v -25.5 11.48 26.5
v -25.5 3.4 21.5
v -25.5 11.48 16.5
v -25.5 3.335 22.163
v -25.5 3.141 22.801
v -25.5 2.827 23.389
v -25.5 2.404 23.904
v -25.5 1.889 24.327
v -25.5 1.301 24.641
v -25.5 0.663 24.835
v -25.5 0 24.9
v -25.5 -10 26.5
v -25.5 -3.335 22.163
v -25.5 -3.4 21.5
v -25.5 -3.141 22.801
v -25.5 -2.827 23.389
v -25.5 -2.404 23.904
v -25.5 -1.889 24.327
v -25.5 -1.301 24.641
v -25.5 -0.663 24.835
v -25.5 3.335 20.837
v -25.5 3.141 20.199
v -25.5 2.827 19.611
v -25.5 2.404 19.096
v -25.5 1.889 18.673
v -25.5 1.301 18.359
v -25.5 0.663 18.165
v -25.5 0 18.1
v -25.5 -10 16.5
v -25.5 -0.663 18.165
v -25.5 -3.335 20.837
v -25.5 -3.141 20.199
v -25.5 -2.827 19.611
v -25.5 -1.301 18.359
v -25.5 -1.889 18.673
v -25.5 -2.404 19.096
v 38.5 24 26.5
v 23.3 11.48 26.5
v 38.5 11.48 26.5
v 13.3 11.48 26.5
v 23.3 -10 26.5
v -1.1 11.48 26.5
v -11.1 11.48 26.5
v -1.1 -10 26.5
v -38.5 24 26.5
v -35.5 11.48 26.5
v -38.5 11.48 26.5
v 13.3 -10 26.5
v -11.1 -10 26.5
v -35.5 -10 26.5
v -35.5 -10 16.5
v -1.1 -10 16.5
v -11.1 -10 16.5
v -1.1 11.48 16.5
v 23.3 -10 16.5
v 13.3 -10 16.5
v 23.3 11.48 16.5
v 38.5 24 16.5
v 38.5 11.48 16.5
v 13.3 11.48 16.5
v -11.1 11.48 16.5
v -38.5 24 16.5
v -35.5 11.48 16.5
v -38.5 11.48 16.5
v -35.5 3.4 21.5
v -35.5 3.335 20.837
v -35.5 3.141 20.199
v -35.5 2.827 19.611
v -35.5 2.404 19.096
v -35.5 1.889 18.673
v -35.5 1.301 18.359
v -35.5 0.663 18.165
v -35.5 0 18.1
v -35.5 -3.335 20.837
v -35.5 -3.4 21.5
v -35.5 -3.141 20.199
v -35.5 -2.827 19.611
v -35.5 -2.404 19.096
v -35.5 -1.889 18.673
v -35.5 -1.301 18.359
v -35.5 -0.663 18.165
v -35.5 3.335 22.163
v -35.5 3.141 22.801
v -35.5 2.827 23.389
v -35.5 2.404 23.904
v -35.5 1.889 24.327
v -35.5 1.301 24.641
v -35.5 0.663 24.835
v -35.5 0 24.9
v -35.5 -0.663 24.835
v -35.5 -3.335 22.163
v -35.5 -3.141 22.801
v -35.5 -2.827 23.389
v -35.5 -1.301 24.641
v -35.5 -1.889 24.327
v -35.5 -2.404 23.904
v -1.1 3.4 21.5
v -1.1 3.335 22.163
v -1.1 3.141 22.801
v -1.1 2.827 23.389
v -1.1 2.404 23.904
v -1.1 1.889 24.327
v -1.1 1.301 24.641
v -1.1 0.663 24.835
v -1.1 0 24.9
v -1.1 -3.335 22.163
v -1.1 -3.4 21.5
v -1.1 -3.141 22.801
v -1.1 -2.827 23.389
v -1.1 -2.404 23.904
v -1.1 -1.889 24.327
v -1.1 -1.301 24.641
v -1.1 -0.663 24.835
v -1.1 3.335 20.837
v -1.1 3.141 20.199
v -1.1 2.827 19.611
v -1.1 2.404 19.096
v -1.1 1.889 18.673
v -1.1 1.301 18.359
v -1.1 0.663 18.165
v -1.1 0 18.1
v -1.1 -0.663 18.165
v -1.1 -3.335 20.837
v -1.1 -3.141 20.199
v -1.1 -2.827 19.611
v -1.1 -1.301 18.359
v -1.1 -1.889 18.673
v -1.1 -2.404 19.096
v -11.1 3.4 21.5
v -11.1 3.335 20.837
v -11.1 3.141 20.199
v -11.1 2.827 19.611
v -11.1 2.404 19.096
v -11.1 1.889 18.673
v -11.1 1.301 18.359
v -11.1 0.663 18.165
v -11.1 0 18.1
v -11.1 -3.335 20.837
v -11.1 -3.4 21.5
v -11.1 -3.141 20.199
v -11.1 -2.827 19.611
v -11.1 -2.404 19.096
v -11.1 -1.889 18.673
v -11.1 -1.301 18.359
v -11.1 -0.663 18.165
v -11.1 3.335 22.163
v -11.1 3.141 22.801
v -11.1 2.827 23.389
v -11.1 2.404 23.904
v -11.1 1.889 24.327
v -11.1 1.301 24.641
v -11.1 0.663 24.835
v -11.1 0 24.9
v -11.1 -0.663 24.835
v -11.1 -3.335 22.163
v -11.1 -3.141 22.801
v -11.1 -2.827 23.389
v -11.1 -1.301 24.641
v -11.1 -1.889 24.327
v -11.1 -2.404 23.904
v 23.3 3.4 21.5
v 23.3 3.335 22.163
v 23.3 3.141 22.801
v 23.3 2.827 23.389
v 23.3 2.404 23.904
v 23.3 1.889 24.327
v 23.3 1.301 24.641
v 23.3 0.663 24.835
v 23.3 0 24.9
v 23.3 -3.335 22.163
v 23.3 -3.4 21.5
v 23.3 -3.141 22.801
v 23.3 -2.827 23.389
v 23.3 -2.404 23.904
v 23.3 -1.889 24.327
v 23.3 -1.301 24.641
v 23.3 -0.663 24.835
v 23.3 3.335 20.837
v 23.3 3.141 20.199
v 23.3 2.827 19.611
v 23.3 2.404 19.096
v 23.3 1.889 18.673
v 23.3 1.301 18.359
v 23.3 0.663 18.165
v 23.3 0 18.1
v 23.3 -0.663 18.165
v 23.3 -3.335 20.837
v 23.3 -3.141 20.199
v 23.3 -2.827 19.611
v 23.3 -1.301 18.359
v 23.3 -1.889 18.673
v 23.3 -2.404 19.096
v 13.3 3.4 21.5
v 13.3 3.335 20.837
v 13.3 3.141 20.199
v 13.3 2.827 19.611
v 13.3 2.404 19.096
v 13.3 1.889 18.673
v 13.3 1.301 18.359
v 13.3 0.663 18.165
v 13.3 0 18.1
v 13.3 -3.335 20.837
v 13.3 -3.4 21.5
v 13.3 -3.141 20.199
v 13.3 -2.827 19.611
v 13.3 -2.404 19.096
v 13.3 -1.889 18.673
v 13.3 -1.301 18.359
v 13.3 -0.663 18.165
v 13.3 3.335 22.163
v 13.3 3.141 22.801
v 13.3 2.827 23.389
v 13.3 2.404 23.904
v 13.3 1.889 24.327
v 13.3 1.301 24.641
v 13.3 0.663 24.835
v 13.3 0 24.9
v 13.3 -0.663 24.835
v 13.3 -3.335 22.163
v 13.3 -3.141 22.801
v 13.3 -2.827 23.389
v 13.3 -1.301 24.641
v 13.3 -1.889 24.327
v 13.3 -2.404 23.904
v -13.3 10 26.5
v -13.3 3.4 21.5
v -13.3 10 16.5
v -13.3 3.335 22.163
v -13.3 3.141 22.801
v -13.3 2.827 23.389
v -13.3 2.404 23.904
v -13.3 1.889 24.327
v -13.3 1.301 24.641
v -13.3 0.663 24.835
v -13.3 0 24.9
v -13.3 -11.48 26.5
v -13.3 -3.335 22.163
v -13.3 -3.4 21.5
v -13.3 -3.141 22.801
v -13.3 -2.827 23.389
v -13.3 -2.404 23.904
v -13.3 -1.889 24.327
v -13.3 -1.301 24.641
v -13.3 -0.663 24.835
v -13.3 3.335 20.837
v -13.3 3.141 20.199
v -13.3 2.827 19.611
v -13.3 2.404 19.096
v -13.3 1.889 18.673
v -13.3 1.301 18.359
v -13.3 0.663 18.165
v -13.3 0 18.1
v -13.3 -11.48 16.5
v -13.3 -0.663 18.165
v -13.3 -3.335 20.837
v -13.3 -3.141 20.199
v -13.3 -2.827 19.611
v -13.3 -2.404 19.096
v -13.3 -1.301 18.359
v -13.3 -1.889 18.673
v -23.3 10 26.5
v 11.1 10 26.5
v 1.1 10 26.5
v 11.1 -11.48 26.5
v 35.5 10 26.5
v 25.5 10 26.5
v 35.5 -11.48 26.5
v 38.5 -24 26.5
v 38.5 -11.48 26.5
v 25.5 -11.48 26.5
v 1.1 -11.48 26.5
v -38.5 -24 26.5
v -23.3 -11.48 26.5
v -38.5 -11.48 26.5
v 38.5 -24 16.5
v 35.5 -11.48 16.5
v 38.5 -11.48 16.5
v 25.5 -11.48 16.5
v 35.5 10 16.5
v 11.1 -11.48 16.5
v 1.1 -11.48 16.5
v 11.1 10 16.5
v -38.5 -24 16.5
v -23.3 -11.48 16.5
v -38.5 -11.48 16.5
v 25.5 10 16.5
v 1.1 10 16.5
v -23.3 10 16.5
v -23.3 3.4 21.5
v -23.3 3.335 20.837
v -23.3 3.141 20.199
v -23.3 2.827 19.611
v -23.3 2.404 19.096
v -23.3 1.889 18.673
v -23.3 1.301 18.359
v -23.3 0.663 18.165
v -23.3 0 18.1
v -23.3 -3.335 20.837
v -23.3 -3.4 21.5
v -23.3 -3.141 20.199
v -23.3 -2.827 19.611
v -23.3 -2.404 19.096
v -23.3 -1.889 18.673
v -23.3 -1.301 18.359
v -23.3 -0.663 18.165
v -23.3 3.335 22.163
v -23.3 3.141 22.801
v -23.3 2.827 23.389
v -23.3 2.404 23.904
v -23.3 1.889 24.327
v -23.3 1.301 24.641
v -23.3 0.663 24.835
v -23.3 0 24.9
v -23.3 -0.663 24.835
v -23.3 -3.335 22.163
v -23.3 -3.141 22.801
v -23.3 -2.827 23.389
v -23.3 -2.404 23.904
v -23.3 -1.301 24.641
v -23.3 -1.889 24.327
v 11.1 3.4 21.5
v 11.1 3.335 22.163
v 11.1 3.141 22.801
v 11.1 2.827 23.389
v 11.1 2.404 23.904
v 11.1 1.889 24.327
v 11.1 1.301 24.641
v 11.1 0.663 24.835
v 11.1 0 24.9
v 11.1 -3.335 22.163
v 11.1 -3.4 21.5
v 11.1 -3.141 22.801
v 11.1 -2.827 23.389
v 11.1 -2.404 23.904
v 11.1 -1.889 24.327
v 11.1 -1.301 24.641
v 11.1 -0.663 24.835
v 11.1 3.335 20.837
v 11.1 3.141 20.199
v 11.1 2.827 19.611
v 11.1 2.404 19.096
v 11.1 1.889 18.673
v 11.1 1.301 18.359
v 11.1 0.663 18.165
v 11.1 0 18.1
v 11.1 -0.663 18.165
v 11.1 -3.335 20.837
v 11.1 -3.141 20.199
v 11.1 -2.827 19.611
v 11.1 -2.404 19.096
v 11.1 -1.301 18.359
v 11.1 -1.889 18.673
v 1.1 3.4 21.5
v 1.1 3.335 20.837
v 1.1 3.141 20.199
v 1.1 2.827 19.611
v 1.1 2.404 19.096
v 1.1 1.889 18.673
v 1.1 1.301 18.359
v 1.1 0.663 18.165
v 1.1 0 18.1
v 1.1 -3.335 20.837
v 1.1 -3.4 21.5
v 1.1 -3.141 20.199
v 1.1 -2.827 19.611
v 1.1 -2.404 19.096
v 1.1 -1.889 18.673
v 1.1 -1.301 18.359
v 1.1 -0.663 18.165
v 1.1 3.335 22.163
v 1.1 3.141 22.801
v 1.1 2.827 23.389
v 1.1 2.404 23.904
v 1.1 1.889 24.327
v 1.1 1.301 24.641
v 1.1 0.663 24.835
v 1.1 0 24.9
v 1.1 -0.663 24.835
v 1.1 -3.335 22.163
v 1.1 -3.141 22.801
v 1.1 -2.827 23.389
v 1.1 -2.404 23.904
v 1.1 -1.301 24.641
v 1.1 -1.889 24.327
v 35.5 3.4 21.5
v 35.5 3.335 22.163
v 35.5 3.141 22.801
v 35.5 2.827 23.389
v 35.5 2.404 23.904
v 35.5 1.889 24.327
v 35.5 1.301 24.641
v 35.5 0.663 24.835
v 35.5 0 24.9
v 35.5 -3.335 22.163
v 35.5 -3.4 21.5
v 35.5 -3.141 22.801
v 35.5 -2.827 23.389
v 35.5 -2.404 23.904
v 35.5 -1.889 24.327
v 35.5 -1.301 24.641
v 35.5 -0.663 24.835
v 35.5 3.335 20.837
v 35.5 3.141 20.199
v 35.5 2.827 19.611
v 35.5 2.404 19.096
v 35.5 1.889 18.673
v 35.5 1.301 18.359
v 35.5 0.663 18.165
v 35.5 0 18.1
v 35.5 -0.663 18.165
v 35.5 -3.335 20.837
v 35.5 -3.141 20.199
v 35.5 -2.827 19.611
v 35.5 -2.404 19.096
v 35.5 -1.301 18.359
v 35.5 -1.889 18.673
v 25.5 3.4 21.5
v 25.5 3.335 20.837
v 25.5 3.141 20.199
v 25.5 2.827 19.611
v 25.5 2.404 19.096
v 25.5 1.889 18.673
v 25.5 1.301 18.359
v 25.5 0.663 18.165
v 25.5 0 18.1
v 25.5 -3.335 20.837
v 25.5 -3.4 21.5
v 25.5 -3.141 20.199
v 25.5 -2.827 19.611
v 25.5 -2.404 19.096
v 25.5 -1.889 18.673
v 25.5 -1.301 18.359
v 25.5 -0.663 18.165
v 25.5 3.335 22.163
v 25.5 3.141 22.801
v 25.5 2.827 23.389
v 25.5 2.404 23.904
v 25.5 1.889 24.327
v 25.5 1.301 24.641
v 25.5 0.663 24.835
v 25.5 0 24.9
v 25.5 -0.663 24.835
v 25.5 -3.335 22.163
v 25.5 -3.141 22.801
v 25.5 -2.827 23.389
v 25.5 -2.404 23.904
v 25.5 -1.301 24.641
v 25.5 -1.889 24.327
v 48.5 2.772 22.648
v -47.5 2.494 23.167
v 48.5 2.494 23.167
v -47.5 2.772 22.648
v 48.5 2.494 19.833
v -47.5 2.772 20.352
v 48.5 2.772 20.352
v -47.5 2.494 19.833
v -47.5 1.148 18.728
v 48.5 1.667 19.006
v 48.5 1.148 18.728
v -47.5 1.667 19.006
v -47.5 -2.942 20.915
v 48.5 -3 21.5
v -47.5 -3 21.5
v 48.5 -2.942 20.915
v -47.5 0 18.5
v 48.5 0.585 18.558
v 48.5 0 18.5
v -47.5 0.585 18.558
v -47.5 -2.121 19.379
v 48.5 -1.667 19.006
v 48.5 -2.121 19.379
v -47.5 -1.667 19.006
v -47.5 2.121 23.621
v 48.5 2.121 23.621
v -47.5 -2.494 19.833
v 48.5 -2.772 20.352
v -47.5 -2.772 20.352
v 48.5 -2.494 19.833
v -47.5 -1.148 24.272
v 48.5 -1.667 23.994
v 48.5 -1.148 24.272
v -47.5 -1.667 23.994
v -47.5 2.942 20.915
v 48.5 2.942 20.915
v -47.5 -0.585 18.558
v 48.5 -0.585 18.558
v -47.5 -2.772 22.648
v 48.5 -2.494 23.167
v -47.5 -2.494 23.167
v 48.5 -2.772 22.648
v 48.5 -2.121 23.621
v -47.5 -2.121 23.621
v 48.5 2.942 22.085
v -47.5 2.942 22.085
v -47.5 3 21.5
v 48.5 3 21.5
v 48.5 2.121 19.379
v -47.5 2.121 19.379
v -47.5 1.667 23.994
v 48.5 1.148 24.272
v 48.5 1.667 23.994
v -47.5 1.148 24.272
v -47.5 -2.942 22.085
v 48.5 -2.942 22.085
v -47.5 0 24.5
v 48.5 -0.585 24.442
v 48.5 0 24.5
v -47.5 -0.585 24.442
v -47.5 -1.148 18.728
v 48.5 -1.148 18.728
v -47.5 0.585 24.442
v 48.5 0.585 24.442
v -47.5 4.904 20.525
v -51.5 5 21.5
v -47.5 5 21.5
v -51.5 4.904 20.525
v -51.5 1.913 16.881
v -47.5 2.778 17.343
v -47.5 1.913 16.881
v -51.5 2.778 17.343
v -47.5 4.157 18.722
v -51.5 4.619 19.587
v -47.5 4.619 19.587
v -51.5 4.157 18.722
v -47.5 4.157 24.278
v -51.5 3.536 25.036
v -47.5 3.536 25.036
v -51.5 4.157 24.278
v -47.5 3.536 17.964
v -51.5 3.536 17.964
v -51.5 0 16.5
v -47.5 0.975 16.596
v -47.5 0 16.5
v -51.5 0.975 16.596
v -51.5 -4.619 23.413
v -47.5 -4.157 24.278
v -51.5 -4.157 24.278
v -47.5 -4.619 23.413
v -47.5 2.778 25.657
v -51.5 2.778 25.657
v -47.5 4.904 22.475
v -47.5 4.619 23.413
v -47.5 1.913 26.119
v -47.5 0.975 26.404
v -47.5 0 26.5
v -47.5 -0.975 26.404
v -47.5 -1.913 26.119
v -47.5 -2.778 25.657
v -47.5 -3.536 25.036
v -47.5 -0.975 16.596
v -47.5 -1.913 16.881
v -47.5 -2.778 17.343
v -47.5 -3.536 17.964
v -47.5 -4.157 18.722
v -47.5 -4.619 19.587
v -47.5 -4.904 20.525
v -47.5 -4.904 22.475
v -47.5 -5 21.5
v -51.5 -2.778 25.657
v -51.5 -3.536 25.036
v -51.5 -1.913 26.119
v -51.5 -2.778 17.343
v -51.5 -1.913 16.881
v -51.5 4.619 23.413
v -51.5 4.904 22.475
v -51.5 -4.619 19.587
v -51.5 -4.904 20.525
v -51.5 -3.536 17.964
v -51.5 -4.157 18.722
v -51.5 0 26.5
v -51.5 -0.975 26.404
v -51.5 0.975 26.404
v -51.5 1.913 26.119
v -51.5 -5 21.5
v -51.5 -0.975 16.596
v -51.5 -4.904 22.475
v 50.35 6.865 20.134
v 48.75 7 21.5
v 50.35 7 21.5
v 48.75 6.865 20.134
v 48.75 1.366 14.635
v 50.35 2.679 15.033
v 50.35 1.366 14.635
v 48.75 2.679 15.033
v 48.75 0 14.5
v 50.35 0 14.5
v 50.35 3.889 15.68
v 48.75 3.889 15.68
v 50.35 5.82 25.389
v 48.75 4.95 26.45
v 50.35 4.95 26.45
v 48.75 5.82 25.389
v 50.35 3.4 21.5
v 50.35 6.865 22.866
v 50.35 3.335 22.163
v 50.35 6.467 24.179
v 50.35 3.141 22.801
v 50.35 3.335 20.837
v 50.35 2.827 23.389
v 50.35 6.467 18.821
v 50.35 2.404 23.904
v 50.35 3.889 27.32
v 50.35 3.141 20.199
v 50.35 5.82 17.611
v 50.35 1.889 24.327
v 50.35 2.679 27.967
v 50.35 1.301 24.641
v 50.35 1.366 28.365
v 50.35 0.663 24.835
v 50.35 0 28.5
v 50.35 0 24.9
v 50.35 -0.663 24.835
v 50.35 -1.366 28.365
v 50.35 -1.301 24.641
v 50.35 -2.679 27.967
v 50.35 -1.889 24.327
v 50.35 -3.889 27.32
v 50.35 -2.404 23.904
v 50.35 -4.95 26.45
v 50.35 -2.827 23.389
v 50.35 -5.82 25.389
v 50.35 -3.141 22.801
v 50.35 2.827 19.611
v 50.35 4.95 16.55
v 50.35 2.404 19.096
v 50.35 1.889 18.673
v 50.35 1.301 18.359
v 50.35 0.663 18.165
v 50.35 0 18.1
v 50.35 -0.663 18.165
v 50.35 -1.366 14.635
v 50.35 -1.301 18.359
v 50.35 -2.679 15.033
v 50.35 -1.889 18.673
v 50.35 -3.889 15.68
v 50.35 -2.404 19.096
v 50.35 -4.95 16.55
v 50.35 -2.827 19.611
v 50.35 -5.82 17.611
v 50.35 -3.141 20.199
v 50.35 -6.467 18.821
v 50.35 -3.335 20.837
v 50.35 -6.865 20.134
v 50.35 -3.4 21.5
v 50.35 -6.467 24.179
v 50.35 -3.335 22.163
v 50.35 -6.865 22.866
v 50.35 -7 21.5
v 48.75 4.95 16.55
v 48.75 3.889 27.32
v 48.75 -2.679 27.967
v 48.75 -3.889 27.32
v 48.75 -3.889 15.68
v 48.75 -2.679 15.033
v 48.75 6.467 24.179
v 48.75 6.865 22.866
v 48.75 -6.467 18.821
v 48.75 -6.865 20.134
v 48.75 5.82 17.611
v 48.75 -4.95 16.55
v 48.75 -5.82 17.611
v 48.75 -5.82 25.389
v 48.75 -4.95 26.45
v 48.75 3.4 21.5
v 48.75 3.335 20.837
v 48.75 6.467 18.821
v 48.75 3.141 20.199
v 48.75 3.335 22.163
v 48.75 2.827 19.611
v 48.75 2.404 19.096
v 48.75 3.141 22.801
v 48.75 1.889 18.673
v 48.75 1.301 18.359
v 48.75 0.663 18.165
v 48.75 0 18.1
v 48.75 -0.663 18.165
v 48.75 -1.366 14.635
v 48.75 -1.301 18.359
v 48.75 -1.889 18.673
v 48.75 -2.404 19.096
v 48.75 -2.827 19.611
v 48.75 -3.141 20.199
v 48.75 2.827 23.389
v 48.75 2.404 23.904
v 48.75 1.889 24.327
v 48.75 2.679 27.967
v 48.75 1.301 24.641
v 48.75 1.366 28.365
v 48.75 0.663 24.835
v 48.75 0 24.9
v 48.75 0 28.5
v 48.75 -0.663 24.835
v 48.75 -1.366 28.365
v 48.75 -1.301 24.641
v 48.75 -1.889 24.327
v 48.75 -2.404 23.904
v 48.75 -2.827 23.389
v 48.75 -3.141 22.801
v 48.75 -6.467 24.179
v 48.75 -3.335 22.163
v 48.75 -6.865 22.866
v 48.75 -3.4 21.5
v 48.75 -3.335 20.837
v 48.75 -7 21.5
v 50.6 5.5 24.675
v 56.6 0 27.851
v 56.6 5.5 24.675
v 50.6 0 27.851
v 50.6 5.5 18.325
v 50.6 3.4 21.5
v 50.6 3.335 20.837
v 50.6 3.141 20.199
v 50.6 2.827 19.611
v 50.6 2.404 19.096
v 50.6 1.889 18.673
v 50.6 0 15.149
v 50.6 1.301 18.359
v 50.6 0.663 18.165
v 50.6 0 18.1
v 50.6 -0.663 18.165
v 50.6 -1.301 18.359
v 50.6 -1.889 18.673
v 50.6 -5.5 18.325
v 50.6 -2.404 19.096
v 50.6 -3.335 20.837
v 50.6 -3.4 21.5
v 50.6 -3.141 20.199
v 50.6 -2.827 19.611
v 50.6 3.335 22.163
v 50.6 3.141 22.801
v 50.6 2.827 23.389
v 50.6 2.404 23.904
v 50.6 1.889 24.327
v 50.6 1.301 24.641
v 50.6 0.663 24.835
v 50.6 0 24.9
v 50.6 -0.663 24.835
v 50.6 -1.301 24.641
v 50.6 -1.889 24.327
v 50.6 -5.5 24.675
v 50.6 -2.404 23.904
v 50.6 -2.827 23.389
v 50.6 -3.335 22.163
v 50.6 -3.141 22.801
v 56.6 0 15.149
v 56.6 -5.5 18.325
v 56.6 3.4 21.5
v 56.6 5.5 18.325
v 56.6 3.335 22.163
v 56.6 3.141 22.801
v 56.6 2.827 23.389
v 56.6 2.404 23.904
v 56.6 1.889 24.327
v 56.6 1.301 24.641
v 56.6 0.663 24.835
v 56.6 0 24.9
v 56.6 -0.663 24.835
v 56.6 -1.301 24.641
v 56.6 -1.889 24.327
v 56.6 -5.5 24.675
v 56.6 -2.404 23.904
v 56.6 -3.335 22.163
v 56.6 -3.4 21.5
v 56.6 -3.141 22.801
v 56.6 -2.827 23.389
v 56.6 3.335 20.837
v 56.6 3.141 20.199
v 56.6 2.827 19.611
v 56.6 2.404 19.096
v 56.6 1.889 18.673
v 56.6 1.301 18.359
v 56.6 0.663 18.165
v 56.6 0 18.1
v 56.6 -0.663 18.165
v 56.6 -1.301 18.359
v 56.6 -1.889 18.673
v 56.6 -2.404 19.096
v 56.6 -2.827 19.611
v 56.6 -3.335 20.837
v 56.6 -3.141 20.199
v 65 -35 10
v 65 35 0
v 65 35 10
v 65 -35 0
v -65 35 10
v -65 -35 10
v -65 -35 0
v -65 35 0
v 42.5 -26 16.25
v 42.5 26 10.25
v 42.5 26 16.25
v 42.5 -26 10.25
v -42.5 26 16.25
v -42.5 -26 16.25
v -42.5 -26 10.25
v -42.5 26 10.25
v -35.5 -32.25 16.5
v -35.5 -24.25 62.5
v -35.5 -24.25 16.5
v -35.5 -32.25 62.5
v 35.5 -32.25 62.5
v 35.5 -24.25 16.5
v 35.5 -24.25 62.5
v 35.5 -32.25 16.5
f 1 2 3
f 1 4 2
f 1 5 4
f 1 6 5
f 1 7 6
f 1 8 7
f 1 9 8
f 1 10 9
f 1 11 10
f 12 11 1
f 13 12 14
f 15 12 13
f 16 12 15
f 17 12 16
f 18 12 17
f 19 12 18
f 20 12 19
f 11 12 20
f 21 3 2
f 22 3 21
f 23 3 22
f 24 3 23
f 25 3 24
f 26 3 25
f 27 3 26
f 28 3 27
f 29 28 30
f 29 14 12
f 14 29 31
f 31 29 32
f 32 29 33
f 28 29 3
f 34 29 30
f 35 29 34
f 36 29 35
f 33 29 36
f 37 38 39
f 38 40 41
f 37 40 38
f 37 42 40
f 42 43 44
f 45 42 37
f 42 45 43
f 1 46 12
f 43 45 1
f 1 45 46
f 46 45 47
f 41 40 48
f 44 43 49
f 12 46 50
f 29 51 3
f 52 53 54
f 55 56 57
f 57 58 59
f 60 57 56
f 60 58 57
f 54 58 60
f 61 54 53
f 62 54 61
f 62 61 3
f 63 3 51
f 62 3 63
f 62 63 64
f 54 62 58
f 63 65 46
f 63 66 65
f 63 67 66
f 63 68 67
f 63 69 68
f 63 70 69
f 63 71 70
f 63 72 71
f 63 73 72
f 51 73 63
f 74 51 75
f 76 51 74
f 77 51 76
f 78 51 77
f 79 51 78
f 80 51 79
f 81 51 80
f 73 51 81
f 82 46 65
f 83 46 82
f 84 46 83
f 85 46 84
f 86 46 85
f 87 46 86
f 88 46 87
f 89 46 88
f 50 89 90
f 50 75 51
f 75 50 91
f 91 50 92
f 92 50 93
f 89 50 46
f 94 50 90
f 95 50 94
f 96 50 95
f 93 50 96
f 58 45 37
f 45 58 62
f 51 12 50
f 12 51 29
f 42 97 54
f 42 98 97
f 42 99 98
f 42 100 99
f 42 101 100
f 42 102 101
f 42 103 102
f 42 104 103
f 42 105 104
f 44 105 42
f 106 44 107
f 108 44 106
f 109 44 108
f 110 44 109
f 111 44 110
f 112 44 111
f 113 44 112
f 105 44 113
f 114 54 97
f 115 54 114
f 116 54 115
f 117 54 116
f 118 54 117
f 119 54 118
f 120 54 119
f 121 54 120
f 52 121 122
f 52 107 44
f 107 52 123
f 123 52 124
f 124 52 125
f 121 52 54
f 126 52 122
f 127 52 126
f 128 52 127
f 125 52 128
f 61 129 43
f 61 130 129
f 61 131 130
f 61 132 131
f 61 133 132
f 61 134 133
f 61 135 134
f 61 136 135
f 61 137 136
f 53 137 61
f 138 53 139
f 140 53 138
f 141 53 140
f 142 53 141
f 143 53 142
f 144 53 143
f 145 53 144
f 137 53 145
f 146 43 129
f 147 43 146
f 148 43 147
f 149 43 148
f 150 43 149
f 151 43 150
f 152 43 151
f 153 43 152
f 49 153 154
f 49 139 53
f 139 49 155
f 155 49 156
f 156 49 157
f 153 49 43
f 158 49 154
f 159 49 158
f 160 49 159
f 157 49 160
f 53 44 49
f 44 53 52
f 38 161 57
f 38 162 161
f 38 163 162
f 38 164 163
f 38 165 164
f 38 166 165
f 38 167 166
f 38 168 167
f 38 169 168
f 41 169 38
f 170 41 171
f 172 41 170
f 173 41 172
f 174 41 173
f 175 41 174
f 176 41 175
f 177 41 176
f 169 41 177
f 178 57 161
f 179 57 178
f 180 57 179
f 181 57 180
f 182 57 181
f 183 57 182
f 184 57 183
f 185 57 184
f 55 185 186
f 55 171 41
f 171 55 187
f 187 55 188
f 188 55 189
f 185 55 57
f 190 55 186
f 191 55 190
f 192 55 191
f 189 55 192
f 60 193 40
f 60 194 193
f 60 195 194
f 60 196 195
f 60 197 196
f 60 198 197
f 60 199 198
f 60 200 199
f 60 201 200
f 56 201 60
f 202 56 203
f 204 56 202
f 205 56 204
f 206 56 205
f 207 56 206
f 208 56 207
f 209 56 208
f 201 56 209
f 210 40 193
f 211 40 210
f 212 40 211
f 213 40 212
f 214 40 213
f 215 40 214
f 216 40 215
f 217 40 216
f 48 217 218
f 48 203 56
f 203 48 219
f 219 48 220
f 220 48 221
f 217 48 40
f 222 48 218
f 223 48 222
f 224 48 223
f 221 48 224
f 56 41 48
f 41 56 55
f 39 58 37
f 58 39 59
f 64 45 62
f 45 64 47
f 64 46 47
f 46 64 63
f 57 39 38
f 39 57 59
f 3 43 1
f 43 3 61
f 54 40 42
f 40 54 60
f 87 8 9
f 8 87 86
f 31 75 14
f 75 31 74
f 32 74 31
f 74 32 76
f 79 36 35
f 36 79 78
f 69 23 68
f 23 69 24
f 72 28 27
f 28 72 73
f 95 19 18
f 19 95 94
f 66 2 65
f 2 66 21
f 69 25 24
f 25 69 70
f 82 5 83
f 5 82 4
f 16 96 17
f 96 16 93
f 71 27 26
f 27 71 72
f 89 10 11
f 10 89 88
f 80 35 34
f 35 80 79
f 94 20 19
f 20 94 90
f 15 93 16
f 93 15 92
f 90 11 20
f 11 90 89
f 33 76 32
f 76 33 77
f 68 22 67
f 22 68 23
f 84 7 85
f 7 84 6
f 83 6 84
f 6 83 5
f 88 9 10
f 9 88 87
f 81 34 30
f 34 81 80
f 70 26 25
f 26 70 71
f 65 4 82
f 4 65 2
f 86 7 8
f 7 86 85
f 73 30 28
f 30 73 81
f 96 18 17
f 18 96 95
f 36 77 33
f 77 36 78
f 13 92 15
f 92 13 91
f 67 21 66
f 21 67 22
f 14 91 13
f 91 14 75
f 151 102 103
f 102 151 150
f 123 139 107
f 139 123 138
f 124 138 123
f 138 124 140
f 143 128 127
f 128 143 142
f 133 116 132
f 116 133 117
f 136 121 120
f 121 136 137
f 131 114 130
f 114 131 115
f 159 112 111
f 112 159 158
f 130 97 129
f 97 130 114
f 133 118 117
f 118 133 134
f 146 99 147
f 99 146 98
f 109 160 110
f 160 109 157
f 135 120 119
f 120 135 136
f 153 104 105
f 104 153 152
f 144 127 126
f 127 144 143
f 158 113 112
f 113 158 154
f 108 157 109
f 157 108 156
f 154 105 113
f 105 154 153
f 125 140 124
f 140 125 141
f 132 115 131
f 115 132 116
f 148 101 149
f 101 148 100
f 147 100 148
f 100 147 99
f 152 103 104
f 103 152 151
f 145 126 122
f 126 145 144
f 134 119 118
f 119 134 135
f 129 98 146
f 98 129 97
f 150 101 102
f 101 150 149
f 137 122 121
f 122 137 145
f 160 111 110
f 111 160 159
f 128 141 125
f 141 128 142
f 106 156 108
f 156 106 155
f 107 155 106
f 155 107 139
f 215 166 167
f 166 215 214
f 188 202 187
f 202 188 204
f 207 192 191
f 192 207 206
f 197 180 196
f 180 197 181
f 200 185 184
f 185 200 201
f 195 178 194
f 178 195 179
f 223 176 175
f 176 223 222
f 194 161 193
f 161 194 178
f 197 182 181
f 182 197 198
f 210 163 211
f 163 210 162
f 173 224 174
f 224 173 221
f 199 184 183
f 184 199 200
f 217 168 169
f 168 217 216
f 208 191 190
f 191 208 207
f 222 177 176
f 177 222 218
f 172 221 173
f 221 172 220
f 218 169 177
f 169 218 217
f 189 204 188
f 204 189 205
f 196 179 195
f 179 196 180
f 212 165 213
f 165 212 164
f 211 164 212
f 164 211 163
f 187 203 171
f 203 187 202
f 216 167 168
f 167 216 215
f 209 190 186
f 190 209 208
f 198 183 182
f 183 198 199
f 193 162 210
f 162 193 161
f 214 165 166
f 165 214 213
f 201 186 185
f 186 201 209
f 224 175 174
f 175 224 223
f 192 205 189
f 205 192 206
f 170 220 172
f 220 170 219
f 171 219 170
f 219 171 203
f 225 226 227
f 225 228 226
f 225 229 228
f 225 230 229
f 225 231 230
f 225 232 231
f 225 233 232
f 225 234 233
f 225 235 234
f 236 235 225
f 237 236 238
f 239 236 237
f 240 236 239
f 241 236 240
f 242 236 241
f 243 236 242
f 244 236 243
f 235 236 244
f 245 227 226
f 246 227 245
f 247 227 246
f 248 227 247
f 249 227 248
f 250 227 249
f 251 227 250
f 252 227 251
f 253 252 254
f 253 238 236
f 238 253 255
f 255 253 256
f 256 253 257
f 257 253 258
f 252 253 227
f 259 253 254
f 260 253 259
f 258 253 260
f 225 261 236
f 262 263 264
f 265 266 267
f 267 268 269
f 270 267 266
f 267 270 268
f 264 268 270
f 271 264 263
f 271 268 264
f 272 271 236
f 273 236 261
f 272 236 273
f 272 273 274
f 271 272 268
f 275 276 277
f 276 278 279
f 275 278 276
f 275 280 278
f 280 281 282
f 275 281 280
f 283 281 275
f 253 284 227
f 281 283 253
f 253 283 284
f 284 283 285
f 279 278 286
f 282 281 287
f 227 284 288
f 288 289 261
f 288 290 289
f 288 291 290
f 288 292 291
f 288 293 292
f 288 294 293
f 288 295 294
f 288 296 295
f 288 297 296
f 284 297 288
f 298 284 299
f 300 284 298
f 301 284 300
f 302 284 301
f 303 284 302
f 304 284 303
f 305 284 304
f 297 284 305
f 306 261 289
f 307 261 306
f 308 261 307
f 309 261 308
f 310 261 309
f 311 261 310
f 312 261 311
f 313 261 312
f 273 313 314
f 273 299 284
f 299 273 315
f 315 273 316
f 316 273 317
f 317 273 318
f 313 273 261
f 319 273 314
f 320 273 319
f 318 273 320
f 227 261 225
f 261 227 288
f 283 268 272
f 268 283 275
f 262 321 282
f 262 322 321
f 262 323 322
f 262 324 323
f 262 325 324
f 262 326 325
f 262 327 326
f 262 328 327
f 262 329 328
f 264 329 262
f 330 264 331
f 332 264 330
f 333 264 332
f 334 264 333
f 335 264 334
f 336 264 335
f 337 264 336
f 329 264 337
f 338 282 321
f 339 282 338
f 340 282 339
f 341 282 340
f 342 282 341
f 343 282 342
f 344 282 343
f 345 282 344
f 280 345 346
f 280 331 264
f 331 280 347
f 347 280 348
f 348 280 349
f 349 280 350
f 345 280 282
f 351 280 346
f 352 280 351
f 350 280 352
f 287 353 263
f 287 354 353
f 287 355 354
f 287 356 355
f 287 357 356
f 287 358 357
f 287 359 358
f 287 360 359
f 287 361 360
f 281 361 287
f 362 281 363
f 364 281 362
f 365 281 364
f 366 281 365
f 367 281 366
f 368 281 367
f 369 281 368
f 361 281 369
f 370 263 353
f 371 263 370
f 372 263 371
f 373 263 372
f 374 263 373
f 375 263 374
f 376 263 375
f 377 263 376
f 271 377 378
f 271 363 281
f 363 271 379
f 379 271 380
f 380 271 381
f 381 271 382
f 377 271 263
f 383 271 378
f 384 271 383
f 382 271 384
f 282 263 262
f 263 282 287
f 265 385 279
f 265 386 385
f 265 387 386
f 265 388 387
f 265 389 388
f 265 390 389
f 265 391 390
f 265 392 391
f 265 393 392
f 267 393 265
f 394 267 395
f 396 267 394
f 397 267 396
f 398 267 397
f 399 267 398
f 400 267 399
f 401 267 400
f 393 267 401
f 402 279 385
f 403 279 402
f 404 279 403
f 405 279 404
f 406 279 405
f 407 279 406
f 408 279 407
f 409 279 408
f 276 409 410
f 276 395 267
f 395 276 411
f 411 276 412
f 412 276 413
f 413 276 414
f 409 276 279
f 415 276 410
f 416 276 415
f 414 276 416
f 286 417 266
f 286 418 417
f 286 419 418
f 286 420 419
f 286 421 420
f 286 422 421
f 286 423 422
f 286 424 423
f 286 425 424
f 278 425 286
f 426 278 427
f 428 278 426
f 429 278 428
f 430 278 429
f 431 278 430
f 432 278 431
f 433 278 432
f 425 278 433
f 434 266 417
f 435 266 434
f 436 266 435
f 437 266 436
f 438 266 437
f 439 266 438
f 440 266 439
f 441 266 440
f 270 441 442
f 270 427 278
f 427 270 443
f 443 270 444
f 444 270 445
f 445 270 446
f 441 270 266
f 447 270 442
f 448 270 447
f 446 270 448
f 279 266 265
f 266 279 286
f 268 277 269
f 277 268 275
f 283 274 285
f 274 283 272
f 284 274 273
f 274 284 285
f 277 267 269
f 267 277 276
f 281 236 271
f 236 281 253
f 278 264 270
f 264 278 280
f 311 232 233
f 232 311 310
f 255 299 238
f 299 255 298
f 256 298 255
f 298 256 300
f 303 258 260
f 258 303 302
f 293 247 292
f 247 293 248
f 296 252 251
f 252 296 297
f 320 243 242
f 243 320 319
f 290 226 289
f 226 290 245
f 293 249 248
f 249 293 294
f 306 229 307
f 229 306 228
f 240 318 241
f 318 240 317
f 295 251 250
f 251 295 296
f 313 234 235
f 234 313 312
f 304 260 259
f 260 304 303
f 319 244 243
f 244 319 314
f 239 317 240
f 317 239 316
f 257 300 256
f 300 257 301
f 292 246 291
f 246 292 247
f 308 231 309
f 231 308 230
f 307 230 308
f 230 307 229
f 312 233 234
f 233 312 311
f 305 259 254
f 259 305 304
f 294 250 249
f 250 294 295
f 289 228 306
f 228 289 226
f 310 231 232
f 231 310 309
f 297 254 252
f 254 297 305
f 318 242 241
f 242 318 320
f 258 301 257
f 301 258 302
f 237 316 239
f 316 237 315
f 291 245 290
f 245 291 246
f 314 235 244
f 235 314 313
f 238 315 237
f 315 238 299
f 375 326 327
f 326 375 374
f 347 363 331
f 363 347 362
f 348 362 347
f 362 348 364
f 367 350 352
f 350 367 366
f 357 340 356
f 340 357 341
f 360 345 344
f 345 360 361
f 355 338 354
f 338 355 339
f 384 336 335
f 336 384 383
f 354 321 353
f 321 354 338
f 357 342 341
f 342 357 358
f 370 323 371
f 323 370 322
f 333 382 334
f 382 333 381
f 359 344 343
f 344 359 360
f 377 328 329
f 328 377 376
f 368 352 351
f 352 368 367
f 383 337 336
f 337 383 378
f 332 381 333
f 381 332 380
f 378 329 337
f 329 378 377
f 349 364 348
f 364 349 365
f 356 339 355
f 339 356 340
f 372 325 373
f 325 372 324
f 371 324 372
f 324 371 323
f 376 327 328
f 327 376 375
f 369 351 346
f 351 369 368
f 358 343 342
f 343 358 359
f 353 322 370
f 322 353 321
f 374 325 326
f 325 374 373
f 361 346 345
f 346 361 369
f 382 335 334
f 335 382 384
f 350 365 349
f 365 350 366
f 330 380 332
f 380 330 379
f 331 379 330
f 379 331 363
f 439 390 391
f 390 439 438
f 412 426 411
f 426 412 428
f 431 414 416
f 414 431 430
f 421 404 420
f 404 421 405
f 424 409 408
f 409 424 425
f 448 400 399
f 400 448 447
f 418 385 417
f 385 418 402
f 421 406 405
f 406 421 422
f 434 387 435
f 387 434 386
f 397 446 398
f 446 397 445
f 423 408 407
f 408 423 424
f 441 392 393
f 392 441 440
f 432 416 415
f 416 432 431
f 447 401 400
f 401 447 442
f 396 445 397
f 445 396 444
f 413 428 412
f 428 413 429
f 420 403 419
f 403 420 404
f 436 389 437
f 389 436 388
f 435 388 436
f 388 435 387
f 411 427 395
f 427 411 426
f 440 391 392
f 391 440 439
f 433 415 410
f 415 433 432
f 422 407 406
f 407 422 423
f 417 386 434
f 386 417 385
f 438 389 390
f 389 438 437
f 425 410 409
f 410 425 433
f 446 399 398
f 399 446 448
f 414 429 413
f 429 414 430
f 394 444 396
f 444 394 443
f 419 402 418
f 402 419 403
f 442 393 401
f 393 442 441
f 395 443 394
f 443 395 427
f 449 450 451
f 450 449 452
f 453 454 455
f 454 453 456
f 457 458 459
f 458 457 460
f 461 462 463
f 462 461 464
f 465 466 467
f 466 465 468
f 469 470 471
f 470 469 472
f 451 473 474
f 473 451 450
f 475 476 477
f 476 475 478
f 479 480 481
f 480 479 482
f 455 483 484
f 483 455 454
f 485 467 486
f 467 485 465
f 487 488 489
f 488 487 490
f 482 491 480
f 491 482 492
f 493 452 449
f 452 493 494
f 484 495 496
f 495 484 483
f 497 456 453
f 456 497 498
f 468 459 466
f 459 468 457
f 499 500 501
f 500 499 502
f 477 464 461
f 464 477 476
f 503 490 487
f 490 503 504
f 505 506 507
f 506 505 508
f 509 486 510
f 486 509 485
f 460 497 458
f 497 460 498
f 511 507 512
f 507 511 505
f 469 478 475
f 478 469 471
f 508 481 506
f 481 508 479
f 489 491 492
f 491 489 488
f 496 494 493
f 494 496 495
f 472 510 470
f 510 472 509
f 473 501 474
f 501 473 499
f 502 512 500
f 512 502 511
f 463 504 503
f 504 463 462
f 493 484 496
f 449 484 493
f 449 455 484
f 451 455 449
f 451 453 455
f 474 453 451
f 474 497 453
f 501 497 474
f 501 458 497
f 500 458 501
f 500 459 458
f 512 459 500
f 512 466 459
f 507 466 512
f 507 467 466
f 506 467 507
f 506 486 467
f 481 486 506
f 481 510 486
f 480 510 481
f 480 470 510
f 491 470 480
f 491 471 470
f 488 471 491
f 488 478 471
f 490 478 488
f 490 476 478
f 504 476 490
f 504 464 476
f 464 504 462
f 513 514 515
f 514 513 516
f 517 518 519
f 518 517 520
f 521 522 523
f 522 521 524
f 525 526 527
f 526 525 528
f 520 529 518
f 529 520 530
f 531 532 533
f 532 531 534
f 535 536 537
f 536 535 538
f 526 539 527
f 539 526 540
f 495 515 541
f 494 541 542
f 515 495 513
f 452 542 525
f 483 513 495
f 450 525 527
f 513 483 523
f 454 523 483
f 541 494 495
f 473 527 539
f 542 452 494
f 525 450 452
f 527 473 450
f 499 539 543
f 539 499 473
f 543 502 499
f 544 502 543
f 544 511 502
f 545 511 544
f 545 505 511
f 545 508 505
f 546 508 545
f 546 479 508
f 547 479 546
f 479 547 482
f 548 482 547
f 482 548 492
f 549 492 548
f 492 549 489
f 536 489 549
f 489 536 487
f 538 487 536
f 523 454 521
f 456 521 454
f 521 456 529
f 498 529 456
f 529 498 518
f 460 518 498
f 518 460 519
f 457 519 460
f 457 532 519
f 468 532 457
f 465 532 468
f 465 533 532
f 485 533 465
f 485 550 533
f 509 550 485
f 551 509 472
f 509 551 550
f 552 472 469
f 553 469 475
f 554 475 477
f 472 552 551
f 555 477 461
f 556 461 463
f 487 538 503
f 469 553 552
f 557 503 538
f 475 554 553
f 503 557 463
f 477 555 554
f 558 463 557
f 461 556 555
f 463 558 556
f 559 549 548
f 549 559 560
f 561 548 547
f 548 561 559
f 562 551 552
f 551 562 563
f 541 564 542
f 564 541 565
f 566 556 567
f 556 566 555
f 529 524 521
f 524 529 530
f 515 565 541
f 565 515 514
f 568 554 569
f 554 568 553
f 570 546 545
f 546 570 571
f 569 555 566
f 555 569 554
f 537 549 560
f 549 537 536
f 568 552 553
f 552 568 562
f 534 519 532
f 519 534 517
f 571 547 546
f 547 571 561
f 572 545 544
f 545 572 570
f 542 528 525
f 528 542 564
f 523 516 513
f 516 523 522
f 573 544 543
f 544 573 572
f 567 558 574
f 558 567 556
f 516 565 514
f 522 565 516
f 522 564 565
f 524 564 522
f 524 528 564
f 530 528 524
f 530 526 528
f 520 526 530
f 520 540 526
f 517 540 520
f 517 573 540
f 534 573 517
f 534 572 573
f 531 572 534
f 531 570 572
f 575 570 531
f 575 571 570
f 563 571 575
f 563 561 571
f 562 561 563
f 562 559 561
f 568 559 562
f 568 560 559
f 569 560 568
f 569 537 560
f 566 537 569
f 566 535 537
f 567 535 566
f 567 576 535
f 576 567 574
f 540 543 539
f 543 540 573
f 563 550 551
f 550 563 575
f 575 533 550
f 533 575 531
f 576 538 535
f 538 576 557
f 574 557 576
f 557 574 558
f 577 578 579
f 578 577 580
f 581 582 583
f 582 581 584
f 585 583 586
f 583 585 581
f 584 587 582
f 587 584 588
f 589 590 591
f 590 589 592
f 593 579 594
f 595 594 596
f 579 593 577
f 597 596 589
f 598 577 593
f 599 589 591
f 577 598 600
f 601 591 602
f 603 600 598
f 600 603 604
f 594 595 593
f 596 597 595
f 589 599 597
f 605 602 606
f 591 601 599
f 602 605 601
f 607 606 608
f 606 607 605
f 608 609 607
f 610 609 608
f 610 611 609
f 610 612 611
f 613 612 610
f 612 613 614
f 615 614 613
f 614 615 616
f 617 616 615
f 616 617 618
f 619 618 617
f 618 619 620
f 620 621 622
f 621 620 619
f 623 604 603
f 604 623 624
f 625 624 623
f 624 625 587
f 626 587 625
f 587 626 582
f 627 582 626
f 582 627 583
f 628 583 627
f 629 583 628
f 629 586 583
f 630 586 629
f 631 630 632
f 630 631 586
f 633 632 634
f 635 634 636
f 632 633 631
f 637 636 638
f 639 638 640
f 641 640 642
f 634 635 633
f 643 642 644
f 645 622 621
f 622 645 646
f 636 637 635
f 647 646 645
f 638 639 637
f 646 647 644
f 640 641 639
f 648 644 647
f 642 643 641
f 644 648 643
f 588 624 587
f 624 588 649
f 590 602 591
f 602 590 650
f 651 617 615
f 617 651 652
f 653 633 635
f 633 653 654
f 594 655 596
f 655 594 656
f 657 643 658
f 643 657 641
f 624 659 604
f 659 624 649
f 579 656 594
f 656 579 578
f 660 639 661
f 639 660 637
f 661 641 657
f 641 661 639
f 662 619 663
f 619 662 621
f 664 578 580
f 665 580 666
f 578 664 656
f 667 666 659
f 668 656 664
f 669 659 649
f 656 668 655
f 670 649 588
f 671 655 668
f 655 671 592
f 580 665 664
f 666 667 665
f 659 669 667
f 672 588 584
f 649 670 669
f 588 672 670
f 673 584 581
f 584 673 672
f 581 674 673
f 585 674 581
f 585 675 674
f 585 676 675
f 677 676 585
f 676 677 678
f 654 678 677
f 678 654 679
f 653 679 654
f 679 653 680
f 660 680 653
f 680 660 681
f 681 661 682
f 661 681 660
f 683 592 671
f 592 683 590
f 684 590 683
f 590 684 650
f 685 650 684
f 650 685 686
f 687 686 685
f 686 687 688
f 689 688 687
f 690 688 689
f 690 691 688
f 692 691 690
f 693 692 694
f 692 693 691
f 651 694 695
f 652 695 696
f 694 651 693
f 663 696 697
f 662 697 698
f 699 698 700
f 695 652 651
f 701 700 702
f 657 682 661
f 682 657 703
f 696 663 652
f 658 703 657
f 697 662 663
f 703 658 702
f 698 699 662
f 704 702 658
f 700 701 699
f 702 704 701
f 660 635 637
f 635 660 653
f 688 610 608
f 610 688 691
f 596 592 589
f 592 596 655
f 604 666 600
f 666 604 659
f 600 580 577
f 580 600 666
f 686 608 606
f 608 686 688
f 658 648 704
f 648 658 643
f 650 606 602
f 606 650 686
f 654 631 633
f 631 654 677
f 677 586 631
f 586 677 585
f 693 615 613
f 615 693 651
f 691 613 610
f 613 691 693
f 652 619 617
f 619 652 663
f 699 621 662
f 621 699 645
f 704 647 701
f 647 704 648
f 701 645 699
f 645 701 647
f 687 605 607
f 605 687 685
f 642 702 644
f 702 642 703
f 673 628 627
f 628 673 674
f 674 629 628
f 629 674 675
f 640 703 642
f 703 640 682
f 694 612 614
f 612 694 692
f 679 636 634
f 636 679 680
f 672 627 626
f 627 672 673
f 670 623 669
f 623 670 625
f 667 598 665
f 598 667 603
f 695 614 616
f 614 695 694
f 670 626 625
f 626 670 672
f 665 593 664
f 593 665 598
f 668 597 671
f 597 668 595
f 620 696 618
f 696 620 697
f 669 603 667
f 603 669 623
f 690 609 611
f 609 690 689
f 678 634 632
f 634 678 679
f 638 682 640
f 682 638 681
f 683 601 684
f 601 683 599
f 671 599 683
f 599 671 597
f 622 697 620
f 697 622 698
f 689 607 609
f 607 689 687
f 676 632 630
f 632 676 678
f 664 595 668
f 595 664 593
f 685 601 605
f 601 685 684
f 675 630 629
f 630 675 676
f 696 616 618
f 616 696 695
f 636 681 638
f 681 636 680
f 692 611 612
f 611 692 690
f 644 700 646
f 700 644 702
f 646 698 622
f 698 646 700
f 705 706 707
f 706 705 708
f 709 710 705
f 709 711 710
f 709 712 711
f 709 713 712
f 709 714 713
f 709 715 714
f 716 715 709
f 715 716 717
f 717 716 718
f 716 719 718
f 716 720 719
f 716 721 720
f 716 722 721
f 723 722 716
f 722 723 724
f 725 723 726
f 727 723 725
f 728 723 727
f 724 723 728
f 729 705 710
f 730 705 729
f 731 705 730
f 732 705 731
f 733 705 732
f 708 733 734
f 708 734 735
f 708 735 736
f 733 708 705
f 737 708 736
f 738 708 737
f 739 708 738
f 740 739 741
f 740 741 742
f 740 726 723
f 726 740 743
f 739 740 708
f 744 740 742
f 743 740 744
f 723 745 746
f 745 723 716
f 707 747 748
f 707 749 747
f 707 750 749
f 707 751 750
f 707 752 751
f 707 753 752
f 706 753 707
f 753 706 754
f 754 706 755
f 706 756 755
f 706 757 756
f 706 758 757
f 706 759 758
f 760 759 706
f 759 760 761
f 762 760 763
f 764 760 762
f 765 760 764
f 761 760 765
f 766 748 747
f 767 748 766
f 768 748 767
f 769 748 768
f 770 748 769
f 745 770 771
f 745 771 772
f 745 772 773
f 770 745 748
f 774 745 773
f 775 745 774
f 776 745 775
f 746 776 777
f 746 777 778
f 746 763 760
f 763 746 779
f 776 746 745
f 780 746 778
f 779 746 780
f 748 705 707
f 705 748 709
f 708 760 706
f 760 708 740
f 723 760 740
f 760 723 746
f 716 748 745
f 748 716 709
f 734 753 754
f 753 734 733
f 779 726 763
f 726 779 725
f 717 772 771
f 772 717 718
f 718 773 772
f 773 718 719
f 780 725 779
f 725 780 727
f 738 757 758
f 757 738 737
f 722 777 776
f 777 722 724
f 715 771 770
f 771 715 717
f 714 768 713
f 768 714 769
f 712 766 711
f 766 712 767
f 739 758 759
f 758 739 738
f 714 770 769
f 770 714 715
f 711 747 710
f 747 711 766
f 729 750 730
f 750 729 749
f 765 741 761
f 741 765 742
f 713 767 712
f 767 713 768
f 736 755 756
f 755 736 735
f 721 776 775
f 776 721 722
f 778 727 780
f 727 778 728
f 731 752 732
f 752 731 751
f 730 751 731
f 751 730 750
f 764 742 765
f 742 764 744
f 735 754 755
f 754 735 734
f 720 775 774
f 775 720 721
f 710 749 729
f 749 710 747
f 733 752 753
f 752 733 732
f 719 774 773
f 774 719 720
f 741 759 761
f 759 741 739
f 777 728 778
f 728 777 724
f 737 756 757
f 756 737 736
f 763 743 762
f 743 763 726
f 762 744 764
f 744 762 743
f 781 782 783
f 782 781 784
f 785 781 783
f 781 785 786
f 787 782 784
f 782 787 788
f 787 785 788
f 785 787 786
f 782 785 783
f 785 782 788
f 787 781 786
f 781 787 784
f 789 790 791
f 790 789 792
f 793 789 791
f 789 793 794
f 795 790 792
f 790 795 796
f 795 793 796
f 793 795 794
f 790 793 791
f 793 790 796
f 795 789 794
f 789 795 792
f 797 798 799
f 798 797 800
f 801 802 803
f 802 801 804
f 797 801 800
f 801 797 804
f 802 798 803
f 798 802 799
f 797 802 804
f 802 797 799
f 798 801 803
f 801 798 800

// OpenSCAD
$fn = 32;

// ------------------------------------------------------------------------
// Comb hinge with flap: leaf 77 x 24 mm, pin d6, flap 46 mm
// Every part is its own module, assembly() places every instance.
// ------------------------------------------------------------------------

// --- part 1 ---
module hinge_bed() {
  difference() {
    translate([-65, -35, 0]) cube([130, 70, 10]);
  }
}

// --- part 2 ---
module hinge_riser() {
  difference() {
    translate([-42.5, -26, 0]) cube([85, 52, 6]);
  }
}

// --- part 3 ---
module hinge_leaf_a() {
  difference() {
    union() {
      translate([-35.5, -10, -5]) cube([10, 34, 10]);
      translate([-11.1, -10, -5]) cube([10, 34, 10]);
      translate([13.3, -10, -5]) cube([10, 34, 10]);
      translate([-38.5, 11.48, -5]) cube([77, 12.52, 10]);
    }
    translate([-30.5, 0, 0]) rotate([0, 90, 0]) cylinder(h = 12, d = 6.8, center = true);
    translate([-6.1, 0, 0]) rotate([0, 90, 0]) cylinder(h = 12, d = 6.8, center = true);
    translate([18.3, 0, 0]) rotate([0, 90, 0]) cylinder(h = 12, d = 6.8, center = true);
  }
}

// --- part 4 ---
module hinge_leaf_b() {
  difference() {
    union() {
      translate([-23.3, -24, -5]) cube([10, 34, 10]);
      translate([1.1, -24, -5]) cube([10, 34, 10]);
      translate([25.5, -24, -5]) cube([10, 34, 10]);
      translate([-38.5, -24, -5]) cube([77, 12.52, 10]);
    }
    translate([-18.3, 0, 0]) rotate([0, 90, 0]) cylinder(h = 12, d = 6.8, center = true);
    translate([6.1, 0, 0]) rotate([0, 90, 0]) cylinder(h = 12, d = 6.8, center = true);
    translate([30.5, 0, 0]) rotate([0, 90, 0]) cylinder(h = 12, d = 6.8, center = true);
  }
}

// --- part 5 ---
module hinge_flap() {
  difference() {
    translate([-35.5, -23, 0]) cube([71, 46, 8]);
  }
}

// --- part 6 ---
module hinge_pin() {
  rotate([0, 90, 0]) cylinder(h = 97, d = 6, center = true);
  translate([-51.5, 0, 0]) rotate([0, 90, 0]) cylinder(h = 4, d = 10);
}

// --- part 7 ---
module pin_washer() {
  difference() {
      translate([0, 0, 0]) cylinder(h = 1.6, d = 14);
      translate([0, 0, -1]) cylinder(h = 3.6, d = 6.8);
    }
}

// --- part 8 ---
module pin_nut() {
  difference() {
    linear_extrude(height = 6) polygon(points = [[6.351, 0], [3.175, 5.5], [-3.175, 5.5], [-6.351, 0], [-3.175, -5.5], [3.175, -5.5]]);
    translate([0, 0, -1]) cylinder(h = 8, d = 6.8);
  }
}

// --- assembly ---
module assembly() {
  color([0.80, 0.24, 0.20]) translate([0, 0, 0]) rotate([0, 0, 0]) hinge_bed();
  color([0.20, 0.45, 0.75]) translate([0, 0, 10.25]) rotate([0, 0, 0]) hinge_riser();
  color([0.25, 0.62, 0.32]) translate([0, 0, 21.5]) rotate([0, 0, 0]) hinge_leaf_a();
  color([0.92, 0.70, 0.18]) translate([0, 0, 21.5]) rotate([0, 0, 0]) hinge_leaf_b();
  color([0.58, 0.35, 0.70]) translate([0, -24.25, 39.5]) rotate([90, 0, 0]) hinge_flap();
  color([0.16, 0.66, 0.66]) translate([0, 0, 21.5]) rotate([0, 0, 0]) hinge_pin();
  color([0.85, 0.48, 0.18]) translate([48.75, 0, 21.5]) rotate([0, 90, 0]) pin_washer();
  color([0.55, 0.60, 0.65]) translate([50.6, 0, 21.5]) rotate([0, 90, 0]) pin_nut();
}

assembly();
